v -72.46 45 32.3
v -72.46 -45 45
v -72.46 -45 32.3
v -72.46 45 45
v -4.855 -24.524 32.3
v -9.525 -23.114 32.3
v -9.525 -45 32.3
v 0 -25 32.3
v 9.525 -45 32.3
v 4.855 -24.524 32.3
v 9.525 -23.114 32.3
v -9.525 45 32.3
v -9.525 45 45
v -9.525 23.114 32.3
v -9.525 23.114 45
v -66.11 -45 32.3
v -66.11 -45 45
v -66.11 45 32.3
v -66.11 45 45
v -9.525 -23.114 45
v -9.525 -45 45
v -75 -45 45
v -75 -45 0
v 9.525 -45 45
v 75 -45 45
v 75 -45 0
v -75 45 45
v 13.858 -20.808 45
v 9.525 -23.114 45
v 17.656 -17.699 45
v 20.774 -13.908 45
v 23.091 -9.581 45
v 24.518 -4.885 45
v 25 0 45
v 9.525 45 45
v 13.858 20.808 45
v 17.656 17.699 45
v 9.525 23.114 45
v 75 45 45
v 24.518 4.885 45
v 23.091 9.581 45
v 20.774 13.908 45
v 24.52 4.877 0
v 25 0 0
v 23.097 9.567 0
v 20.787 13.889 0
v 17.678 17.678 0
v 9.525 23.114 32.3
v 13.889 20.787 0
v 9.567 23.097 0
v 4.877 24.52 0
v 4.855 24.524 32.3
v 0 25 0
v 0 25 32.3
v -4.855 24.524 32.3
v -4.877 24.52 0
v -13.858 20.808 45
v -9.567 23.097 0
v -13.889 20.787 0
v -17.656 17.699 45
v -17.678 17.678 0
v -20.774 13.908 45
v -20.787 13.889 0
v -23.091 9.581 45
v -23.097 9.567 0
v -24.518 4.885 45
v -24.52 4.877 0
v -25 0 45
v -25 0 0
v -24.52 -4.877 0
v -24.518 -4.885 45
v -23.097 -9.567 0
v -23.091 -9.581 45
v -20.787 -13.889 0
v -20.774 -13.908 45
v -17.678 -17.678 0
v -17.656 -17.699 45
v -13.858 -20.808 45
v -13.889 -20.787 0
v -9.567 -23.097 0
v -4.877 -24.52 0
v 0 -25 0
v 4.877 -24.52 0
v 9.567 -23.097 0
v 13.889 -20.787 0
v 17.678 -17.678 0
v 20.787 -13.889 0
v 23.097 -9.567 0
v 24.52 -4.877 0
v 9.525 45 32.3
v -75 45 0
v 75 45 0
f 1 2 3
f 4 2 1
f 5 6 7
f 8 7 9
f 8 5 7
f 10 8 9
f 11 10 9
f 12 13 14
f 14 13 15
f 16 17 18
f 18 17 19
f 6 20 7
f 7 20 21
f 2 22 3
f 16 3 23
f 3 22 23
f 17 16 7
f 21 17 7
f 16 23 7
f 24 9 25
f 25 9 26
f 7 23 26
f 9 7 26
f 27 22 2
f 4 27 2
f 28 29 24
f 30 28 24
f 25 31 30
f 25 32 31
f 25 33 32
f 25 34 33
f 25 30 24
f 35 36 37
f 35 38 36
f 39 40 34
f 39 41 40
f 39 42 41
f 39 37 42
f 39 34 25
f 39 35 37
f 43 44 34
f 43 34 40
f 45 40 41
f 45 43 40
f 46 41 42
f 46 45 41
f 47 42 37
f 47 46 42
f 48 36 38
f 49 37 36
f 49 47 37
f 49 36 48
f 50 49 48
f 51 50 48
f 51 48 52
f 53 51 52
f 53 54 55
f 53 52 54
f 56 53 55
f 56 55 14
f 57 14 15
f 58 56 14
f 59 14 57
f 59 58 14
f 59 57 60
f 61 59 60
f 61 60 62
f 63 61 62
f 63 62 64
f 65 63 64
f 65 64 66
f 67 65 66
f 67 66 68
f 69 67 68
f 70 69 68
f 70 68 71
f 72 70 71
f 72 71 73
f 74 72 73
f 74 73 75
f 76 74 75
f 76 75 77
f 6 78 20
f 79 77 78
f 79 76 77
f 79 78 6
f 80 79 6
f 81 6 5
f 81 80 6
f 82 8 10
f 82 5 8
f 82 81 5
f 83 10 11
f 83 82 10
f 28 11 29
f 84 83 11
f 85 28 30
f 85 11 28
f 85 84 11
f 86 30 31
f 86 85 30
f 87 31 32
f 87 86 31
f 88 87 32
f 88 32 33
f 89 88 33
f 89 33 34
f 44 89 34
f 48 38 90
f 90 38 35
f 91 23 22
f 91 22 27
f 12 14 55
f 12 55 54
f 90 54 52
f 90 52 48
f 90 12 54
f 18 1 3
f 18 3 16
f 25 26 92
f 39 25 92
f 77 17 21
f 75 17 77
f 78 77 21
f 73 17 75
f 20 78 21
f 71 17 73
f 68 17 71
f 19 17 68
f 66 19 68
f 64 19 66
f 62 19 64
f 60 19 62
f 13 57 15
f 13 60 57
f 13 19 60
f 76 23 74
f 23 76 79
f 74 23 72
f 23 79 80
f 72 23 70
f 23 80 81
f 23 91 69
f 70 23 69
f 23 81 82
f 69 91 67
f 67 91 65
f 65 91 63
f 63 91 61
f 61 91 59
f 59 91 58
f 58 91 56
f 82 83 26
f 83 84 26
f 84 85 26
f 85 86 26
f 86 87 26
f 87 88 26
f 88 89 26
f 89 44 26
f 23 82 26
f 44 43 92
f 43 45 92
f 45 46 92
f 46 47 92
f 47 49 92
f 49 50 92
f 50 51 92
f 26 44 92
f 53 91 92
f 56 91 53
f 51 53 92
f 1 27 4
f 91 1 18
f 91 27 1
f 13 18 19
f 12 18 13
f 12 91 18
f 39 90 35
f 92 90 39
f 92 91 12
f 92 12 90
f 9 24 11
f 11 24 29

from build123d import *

# Parameters (mm, degrees)
F0_W     = 150
F0_H     = 90
F0_R     = 25
F1_DEPTH = 45
F2_W     = 6.35
F2_H     = 90
F3_DEPTH = 12.7


# Not quite as in the source:
# - a feature names something its author has since deleted; it is built from what else it names


with BuildPart() as f1:
    # F0 (on Top) → F1 (new body)
    with BuildSketch(Plane.XY):
        Rectangle(F0_W, F0_H)
        Circle(F0_R, mode=Mode.SUBTRACT)
    extrude(amount=F1_DEPTH)

    # F2 (on face) → F3 (cut)
    with BuildSketch(Plane.XY.offset(45)):
        with Locations((-69.285, 0)):
            Rectangle(F2_W, F2_H)
        with BuildLine():
            Line((-9.525, -23.1143759379), (-9.525, -45))
            Line((-9.525, -45), (9.525, -45))
            Line((9.525, -45), (9.525, -23.1143759379))
            ThreePointArc((9.525, -23.1143759379), (0, -25), (-9.525, -23.1143759379))
        make_face()
        with BuildLine():
            Line((9.525, 45), (-9.525, 45))
            Line((-9.525, 45), (-9.525, 23.1143759379))
            ThreePointArc((-9.525, 23.1143759379), (0, 25), (9.525, 23.1143759379))
            Line((9.525, 23.1143759379), (9.525, 45))
        make_face()
    extrude(amount=-F3_DEPTH, mode=Mode.SUBTRACT)


solid = f1.part
